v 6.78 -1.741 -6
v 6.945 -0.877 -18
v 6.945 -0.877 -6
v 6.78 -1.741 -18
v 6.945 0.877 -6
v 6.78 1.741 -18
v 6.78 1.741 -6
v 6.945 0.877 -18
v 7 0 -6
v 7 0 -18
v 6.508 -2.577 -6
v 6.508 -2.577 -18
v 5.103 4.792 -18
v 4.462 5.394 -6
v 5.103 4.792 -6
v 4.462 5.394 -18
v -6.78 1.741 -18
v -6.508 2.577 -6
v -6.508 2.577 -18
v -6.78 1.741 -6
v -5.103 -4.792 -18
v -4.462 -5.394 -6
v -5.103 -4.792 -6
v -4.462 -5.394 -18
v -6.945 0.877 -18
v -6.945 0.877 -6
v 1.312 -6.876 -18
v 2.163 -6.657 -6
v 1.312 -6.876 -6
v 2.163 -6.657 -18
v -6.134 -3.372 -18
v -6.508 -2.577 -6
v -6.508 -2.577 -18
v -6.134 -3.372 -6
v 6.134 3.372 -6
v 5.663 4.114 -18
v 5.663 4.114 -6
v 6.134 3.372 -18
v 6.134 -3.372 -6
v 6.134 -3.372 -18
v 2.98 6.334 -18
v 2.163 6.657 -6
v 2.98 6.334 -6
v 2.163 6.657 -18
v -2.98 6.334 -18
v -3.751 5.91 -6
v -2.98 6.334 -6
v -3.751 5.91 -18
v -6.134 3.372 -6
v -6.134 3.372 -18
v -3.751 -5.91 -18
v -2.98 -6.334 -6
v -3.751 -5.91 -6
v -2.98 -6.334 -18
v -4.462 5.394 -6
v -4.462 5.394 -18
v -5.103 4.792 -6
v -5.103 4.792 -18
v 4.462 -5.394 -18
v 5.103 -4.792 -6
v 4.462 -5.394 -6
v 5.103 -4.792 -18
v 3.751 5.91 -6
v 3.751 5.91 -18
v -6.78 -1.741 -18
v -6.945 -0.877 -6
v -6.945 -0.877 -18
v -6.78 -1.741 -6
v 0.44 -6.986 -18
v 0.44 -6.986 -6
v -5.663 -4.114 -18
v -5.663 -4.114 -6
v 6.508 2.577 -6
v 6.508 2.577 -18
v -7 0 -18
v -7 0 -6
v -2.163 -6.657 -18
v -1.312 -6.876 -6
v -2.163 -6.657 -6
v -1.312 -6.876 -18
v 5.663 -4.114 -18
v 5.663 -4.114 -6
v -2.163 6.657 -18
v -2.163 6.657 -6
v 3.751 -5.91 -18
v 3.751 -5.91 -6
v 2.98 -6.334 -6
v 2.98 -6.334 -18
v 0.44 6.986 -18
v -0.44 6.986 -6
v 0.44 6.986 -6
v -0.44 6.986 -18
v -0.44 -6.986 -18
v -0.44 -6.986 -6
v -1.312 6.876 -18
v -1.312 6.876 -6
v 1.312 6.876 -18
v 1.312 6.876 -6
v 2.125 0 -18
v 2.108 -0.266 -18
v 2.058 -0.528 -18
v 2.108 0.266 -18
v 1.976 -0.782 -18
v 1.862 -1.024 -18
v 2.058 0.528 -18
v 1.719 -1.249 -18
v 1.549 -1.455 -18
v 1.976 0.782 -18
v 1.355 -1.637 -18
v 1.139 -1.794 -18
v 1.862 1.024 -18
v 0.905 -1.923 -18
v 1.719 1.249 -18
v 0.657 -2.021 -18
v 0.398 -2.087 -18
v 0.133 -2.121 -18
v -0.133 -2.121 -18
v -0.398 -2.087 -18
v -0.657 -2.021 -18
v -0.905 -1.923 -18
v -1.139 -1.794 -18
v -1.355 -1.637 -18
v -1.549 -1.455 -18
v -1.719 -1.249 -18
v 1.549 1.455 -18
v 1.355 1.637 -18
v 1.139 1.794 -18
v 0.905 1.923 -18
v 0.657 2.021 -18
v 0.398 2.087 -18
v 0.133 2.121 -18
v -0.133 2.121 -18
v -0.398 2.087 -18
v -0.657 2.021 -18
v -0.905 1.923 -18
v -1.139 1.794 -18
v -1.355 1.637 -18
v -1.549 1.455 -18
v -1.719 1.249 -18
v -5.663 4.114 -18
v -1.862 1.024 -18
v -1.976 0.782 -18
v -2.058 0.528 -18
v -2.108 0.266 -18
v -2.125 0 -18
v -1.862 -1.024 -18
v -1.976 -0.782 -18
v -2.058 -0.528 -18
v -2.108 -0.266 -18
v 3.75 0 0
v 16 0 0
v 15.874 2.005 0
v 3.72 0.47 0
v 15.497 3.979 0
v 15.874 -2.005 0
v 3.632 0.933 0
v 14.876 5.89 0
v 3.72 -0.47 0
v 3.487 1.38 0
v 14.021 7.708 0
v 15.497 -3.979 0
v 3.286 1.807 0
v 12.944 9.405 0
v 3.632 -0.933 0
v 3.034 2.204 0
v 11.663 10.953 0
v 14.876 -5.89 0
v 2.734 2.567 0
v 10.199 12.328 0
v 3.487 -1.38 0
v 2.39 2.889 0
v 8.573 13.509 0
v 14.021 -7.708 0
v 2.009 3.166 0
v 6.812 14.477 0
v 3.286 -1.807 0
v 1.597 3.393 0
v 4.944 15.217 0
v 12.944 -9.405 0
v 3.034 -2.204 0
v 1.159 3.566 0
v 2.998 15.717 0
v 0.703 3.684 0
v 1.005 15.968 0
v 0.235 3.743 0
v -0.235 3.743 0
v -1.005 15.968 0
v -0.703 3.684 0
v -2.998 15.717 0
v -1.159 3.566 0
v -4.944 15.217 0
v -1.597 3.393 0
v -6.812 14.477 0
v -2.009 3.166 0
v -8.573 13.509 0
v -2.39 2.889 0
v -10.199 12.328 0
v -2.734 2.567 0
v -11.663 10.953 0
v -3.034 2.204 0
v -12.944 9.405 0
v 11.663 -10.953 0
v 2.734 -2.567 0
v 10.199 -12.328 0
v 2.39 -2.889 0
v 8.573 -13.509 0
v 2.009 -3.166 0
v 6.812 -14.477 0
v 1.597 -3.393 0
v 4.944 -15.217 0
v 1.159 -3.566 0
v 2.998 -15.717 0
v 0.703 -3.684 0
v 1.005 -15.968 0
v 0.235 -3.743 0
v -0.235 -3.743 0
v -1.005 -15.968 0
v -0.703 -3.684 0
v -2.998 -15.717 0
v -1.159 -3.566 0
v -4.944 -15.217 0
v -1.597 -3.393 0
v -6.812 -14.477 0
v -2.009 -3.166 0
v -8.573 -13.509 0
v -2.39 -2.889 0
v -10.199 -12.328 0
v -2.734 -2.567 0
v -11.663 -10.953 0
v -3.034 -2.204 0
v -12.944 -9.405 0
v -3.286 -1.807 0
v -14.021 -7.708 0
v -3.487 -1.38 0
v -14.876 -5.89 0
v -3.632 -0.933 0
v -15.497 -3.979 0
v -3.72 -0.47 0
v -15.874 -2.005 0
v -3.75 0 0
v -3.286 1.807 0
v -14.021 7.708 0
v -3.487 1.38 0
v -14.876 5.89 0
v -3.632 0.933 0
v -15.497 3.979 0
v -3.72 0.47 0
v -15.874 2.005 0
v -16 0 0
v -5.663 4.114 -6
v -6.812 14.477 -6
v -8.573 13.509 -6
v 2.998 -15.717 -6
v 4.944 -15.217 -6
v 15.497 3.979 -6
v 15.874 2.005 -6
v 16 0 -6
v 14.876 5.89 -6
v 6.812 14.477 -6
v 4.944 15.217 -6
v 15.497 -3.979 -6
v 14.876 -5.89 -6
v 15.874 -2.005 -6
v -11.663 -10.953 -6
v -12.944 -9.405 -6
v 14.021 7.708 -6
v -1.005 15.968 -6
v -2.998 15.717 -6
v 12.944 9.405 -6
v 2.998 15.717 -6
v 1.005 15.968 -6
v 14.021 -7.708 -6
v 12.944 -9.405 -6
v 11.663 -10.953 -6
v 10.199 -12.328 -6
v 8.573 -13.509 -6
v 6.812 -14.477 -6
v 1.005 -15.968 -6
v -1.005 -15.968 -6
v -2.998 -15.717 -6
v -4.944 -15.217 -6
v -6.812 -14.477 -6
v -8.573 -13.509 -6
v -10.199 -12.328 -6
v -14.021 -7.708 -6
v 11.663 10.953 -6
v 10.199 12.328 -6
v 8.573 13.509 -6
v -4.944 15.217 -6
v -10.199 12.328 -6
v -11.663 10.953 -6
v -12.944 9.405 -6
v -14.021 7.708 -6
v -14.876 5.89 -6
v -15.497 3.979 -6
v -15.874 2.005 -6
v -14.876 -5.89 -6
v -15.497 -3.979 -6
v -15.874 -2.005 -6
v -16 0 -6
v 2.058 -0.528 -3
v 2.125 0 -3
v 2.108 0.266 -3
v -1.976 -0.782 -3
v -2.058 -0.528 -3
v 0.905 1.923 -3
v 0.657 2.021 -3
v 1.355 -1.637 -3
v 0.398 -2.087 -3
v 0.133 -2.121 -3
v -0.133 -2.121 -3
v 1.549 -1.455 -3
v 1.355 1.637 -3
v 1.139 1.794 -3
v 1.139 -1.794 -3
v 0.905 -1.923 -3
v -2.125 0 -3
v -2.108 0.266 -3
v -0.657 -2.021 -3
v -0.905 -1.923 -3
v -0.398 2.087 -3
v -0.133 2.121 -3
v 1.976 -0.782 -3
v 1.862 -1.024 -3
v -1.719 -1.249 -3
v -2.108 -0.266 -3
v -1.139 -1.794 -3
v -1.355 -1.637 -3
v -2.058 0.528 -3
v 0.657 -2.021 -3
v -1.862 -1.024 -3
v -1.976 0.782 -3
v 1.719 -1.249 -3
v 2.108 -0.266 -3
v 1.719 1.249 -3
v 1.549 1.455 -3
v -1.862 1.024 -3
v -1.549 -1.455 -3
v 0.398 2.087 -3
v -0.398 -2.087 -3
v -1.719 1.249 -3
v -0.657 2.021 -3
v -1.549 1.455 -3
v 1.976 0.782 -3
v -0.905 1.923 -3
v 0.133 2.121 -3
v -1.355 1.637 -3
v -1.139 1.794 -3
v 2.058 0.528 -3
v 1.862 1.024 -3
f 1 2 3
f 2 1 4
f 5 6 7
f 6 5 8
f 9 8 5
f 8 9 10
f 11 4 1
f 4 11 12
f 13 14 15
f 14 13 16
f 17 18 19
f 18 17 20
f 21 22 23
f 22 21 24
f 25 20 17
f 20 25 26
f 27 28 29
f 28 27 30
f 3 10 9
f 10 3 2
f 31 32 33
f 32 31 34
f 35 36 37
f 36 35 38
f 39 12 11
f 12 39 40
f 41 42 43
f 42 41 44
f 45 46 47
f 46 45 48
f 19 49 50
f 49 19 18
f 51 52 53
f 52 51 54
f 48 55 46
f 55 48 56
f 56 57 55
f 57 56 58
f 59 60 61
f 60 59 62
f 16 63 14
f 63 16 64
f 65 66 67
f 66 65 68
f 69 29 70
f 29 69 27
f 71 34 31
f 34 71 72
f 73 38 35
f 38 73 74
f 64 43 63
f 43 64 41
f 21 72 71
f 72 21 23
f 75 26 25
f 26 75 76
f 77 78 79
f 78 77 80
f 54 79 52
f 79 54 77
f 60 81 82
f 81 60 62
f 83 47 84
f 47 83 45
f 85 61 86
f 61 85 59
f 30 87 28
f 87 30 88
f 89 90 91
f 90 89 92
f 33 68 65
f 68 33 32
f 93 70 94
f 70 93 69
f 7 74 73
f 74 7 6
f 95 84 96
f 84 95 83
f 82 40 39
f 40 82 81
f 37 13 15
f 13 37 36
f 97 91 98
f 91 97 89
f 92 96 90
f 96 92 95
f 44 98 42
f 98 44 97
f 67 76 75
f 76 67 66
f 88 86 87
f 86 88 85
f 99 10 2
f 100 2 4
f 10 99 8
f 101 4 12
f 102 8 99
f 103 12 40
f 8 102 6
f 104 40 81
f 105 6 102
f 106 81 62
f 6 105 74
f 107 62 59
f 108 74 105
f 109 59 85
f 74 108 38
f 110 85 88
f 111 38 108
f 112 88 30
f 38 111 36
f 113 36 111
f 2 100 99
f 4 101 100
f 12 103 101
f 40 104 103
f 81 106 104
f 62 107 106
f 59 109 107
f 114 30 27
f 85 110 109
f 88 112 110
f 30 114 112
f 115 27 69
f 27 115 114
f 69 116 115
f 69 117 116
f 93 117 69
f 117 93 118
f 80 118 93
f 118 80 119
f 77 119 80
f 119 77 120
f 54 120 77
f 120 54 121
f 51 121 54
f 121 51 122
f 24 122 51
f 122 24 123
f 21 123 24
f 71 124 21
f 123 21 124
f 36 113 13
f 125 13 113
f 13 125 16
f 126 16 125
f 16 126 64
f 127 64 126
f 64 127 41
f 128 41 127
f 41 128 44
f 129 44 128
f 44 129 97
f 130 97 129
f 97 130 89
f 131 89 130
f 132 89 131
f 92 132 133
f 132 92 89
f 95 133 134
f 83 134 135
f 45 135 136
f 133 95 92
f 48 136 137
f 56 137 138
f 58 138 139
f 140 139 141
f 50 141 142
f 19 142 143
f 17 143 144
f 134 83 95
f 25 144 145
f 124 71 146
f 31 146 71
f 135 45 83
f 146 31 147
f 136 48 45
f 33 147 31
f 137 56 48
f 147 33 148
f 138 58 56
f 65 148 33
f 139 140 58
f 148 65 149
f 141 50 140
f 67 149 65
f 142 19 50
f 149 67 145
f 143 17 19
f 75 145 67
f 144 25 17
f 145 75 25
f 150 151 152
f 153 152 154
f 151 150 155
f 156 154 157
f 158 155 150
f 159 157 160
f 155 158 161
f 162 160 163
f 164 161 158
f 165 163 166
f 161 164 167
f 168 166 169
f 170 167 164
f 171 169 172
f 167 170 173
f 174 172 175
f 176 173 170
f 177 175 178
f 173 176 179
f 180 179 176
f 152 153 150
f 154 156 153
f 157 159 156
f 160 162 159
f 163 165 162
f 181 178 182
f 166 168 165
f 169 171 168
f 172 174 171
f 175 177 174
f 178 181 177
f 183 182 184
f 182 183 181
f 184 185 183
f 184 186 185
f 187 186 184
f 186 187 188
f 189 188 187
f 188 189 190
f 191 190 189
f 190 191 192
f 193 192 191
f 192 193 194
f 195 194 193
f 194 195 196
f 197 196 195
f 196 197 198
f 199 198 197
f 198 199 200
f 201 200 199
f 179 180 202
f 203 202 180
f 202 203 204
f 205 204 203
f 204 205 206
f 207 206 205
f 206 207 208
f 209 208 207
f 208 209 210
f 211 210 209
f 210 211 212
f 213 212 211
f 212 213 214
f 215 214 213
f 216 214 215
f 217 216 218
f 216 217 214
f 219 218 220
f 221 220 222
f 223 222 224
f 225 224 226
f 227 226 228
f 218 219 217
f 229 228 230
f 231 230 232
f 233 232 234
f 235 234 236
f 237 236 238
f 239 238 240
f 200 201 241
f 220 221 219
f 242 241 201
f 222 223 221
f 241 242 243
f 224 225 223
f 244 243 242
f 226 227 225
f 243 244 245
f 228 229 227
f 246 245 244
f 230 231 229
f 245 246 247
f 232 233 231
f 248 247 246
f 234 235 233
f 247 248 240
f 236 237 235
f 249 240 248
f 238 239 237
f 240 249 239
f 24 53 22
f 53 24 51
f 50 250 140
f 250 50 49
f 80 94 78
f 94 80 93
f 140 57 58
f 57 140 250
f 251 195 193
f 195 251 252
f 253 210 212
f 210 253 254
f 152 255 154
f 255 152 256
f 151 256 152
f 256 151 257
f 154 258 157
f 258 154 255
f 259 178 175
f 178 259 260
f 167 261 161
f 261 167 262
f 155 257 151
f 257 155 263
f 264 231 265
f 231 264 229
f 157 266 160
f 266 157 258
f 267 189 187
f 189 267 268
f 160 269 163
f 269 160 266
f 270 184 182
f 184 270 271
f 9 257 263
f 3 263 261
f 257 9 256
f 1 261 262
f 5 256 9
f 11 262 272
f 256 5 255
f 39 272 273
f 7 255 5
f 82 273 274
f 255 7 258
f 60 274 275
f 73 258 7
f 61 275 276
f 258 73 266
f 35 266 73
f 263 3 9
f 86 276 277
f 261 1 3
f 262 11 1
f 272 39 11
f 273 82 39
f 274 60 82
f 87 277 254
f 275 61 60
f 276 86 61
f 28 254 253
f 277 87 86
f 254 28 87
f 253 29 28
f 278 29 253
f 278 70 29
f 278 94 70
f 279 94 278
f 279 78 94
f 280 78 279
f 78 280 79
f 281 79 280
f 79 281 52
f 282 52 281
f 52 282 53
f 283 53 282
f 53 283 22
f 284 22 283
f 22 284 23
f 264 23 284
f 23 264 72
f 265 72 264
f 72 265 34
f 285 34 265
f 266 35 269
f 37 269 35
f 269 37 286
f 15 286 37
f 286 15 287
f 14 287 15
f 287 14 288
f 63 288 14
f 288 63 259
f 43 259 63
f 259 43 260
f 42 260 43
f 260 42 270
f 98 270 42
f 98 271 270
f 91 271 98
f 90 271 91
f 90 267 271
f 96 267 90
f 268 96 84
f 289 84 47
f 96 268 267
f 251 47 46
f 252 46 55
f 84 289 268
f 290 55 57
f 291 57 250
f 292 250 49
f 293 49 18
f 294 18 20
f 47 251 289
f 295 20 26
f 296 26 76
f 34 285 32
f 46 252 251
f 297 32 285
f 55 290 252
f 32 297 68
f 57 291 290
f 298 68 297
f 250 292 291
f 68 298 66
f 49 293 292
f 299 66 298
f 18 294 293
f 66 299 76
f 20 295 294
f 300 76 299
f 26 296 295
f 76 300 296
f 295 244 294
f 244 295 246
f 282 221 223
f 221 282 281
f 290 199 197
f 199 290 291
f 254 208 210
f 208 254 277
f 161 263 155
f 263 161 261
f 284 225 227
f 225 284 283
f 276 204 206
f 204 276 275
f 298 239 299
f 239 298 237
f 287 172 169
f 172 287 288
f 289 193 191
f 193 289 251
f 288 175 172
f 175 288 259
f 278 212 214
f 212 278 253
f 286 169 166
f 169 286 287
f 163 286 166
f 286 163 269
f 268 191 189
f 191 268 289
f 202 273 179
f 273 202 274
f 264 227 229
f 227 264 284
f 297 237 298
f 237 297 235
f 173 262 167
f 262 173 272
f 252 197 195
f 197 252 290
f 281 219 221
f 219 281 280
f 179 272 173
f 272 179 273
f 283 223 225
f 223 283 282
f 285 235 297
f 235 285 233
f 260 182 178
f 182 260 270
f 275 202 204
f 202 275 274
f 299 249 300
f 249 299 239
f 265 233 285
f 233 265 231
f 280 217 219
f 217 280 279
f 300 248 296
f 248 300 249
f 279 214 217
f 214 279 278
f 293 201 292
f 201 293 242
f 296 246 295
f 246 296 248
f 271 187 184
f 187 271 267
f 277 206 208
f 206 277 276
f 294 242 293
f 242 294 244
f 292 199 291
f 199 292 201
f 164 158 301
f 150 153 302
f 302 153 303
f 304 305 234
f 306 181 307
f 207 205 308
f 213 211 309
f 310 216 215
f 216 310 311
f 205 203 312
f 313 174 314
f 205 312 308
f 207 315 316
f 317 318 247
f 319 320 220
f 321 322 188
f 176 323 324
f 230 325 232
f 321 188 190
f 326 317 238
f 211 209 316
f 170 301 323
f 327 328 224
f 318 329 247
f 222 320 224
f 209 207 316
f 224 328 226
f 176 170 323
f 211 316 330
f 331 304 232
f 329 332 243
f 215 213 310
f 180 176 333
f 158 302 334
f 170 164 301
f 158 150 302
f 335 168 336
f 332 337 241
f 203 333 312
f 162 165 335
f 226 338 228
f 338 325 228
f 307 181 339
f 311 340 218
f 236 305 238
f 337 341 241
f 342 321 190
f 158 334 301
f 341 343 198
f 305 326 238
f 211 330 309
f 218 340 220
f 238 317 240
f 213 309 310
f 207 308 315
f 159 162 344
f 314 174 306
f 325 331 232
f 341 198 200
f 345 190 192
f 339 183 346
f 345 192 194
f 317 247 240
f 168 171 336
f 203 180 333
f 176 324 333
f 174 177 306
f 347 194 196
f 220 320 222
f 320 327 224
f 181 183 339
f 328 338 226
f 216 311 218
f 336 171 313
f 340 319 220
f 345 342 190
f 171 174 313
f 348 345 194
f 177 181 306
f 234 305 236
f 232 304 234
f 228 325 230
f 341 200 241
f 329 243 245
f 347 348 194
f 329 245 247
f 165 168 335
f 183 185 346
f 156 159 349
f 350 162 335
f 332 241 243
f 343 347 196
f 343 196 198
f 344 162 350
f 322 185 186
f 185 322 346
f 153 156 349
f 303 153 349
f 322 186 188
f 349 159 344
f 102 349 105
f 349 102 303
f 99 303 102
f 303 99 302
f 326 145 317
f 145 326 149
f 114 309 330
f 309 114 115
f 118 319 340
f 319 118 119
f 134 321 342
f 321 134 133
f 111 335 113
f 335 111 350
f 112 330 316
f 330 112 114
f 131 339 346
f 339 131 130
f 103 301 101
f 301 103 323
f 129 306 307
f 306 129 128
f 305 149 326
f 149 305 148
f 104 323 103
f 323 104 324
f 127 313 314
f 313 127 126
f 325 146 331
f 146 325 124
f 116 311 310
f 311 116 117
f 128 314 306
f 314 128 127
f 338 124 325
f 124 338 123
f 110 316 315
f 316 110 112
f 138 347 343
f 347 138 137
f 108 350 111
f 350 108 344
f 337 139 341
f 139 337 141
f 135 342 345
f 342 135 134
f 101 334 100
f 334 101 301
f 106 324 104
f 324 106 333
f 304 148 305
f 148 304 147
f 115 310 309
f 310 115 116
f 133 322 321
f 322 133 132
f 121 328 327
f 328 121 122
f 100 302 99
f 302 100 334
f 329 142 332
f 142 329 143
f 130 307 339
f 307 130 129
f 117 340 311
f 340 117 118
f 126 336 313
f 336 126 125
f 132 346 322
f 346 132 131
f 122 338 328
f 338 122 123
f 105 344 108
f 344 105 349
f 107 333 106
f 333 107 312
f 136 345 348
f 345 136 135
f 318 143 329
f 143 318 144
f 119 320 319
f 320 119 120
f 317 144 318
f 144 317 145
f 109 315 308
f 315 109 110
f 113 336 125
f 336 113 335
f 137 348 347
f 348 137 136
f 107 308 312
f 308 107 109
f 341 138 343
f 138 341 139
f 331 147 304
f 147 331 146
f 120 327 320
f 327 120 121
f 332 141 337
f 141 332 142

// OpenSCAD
$fn = 50;


difference() {
	union() {
		translate(v = [0, 0, -18.0000000000]) {
			cylinder(h = 18, r = 7.0000000000);
		}
		translate(v = [0, 0, -6.0000000000]) {
			cylinder(h = 6, r = 16.0000000000);
		}
	}
	union() {
		translate(v = [0, 0, 0]) {
			rotate(a = [0, 0, 0]) {
				difference() {
					union() {
						#translate(v = [0, 0, -18.0000000000]) {
							cylinder(h = 18, r = 2.0000000000);
						}
						#translate(v = [0, 0, -3]) {
							cylinder(h = 3, r = 7.0000000000, r1 = 2.1250000000, r2 = 3.7500000000);
						}
						#translate(v = [0, 0, -18.0000000000]) {
							cylinder(h = 18, r = 2.1250000000);
						}
						#translate(v = [0, 0, -18.0000000000]) {
							cylinder(h = 18, r = 2.0000000000);
						}
					}
					union();
				}
			}
		}
	}
}
